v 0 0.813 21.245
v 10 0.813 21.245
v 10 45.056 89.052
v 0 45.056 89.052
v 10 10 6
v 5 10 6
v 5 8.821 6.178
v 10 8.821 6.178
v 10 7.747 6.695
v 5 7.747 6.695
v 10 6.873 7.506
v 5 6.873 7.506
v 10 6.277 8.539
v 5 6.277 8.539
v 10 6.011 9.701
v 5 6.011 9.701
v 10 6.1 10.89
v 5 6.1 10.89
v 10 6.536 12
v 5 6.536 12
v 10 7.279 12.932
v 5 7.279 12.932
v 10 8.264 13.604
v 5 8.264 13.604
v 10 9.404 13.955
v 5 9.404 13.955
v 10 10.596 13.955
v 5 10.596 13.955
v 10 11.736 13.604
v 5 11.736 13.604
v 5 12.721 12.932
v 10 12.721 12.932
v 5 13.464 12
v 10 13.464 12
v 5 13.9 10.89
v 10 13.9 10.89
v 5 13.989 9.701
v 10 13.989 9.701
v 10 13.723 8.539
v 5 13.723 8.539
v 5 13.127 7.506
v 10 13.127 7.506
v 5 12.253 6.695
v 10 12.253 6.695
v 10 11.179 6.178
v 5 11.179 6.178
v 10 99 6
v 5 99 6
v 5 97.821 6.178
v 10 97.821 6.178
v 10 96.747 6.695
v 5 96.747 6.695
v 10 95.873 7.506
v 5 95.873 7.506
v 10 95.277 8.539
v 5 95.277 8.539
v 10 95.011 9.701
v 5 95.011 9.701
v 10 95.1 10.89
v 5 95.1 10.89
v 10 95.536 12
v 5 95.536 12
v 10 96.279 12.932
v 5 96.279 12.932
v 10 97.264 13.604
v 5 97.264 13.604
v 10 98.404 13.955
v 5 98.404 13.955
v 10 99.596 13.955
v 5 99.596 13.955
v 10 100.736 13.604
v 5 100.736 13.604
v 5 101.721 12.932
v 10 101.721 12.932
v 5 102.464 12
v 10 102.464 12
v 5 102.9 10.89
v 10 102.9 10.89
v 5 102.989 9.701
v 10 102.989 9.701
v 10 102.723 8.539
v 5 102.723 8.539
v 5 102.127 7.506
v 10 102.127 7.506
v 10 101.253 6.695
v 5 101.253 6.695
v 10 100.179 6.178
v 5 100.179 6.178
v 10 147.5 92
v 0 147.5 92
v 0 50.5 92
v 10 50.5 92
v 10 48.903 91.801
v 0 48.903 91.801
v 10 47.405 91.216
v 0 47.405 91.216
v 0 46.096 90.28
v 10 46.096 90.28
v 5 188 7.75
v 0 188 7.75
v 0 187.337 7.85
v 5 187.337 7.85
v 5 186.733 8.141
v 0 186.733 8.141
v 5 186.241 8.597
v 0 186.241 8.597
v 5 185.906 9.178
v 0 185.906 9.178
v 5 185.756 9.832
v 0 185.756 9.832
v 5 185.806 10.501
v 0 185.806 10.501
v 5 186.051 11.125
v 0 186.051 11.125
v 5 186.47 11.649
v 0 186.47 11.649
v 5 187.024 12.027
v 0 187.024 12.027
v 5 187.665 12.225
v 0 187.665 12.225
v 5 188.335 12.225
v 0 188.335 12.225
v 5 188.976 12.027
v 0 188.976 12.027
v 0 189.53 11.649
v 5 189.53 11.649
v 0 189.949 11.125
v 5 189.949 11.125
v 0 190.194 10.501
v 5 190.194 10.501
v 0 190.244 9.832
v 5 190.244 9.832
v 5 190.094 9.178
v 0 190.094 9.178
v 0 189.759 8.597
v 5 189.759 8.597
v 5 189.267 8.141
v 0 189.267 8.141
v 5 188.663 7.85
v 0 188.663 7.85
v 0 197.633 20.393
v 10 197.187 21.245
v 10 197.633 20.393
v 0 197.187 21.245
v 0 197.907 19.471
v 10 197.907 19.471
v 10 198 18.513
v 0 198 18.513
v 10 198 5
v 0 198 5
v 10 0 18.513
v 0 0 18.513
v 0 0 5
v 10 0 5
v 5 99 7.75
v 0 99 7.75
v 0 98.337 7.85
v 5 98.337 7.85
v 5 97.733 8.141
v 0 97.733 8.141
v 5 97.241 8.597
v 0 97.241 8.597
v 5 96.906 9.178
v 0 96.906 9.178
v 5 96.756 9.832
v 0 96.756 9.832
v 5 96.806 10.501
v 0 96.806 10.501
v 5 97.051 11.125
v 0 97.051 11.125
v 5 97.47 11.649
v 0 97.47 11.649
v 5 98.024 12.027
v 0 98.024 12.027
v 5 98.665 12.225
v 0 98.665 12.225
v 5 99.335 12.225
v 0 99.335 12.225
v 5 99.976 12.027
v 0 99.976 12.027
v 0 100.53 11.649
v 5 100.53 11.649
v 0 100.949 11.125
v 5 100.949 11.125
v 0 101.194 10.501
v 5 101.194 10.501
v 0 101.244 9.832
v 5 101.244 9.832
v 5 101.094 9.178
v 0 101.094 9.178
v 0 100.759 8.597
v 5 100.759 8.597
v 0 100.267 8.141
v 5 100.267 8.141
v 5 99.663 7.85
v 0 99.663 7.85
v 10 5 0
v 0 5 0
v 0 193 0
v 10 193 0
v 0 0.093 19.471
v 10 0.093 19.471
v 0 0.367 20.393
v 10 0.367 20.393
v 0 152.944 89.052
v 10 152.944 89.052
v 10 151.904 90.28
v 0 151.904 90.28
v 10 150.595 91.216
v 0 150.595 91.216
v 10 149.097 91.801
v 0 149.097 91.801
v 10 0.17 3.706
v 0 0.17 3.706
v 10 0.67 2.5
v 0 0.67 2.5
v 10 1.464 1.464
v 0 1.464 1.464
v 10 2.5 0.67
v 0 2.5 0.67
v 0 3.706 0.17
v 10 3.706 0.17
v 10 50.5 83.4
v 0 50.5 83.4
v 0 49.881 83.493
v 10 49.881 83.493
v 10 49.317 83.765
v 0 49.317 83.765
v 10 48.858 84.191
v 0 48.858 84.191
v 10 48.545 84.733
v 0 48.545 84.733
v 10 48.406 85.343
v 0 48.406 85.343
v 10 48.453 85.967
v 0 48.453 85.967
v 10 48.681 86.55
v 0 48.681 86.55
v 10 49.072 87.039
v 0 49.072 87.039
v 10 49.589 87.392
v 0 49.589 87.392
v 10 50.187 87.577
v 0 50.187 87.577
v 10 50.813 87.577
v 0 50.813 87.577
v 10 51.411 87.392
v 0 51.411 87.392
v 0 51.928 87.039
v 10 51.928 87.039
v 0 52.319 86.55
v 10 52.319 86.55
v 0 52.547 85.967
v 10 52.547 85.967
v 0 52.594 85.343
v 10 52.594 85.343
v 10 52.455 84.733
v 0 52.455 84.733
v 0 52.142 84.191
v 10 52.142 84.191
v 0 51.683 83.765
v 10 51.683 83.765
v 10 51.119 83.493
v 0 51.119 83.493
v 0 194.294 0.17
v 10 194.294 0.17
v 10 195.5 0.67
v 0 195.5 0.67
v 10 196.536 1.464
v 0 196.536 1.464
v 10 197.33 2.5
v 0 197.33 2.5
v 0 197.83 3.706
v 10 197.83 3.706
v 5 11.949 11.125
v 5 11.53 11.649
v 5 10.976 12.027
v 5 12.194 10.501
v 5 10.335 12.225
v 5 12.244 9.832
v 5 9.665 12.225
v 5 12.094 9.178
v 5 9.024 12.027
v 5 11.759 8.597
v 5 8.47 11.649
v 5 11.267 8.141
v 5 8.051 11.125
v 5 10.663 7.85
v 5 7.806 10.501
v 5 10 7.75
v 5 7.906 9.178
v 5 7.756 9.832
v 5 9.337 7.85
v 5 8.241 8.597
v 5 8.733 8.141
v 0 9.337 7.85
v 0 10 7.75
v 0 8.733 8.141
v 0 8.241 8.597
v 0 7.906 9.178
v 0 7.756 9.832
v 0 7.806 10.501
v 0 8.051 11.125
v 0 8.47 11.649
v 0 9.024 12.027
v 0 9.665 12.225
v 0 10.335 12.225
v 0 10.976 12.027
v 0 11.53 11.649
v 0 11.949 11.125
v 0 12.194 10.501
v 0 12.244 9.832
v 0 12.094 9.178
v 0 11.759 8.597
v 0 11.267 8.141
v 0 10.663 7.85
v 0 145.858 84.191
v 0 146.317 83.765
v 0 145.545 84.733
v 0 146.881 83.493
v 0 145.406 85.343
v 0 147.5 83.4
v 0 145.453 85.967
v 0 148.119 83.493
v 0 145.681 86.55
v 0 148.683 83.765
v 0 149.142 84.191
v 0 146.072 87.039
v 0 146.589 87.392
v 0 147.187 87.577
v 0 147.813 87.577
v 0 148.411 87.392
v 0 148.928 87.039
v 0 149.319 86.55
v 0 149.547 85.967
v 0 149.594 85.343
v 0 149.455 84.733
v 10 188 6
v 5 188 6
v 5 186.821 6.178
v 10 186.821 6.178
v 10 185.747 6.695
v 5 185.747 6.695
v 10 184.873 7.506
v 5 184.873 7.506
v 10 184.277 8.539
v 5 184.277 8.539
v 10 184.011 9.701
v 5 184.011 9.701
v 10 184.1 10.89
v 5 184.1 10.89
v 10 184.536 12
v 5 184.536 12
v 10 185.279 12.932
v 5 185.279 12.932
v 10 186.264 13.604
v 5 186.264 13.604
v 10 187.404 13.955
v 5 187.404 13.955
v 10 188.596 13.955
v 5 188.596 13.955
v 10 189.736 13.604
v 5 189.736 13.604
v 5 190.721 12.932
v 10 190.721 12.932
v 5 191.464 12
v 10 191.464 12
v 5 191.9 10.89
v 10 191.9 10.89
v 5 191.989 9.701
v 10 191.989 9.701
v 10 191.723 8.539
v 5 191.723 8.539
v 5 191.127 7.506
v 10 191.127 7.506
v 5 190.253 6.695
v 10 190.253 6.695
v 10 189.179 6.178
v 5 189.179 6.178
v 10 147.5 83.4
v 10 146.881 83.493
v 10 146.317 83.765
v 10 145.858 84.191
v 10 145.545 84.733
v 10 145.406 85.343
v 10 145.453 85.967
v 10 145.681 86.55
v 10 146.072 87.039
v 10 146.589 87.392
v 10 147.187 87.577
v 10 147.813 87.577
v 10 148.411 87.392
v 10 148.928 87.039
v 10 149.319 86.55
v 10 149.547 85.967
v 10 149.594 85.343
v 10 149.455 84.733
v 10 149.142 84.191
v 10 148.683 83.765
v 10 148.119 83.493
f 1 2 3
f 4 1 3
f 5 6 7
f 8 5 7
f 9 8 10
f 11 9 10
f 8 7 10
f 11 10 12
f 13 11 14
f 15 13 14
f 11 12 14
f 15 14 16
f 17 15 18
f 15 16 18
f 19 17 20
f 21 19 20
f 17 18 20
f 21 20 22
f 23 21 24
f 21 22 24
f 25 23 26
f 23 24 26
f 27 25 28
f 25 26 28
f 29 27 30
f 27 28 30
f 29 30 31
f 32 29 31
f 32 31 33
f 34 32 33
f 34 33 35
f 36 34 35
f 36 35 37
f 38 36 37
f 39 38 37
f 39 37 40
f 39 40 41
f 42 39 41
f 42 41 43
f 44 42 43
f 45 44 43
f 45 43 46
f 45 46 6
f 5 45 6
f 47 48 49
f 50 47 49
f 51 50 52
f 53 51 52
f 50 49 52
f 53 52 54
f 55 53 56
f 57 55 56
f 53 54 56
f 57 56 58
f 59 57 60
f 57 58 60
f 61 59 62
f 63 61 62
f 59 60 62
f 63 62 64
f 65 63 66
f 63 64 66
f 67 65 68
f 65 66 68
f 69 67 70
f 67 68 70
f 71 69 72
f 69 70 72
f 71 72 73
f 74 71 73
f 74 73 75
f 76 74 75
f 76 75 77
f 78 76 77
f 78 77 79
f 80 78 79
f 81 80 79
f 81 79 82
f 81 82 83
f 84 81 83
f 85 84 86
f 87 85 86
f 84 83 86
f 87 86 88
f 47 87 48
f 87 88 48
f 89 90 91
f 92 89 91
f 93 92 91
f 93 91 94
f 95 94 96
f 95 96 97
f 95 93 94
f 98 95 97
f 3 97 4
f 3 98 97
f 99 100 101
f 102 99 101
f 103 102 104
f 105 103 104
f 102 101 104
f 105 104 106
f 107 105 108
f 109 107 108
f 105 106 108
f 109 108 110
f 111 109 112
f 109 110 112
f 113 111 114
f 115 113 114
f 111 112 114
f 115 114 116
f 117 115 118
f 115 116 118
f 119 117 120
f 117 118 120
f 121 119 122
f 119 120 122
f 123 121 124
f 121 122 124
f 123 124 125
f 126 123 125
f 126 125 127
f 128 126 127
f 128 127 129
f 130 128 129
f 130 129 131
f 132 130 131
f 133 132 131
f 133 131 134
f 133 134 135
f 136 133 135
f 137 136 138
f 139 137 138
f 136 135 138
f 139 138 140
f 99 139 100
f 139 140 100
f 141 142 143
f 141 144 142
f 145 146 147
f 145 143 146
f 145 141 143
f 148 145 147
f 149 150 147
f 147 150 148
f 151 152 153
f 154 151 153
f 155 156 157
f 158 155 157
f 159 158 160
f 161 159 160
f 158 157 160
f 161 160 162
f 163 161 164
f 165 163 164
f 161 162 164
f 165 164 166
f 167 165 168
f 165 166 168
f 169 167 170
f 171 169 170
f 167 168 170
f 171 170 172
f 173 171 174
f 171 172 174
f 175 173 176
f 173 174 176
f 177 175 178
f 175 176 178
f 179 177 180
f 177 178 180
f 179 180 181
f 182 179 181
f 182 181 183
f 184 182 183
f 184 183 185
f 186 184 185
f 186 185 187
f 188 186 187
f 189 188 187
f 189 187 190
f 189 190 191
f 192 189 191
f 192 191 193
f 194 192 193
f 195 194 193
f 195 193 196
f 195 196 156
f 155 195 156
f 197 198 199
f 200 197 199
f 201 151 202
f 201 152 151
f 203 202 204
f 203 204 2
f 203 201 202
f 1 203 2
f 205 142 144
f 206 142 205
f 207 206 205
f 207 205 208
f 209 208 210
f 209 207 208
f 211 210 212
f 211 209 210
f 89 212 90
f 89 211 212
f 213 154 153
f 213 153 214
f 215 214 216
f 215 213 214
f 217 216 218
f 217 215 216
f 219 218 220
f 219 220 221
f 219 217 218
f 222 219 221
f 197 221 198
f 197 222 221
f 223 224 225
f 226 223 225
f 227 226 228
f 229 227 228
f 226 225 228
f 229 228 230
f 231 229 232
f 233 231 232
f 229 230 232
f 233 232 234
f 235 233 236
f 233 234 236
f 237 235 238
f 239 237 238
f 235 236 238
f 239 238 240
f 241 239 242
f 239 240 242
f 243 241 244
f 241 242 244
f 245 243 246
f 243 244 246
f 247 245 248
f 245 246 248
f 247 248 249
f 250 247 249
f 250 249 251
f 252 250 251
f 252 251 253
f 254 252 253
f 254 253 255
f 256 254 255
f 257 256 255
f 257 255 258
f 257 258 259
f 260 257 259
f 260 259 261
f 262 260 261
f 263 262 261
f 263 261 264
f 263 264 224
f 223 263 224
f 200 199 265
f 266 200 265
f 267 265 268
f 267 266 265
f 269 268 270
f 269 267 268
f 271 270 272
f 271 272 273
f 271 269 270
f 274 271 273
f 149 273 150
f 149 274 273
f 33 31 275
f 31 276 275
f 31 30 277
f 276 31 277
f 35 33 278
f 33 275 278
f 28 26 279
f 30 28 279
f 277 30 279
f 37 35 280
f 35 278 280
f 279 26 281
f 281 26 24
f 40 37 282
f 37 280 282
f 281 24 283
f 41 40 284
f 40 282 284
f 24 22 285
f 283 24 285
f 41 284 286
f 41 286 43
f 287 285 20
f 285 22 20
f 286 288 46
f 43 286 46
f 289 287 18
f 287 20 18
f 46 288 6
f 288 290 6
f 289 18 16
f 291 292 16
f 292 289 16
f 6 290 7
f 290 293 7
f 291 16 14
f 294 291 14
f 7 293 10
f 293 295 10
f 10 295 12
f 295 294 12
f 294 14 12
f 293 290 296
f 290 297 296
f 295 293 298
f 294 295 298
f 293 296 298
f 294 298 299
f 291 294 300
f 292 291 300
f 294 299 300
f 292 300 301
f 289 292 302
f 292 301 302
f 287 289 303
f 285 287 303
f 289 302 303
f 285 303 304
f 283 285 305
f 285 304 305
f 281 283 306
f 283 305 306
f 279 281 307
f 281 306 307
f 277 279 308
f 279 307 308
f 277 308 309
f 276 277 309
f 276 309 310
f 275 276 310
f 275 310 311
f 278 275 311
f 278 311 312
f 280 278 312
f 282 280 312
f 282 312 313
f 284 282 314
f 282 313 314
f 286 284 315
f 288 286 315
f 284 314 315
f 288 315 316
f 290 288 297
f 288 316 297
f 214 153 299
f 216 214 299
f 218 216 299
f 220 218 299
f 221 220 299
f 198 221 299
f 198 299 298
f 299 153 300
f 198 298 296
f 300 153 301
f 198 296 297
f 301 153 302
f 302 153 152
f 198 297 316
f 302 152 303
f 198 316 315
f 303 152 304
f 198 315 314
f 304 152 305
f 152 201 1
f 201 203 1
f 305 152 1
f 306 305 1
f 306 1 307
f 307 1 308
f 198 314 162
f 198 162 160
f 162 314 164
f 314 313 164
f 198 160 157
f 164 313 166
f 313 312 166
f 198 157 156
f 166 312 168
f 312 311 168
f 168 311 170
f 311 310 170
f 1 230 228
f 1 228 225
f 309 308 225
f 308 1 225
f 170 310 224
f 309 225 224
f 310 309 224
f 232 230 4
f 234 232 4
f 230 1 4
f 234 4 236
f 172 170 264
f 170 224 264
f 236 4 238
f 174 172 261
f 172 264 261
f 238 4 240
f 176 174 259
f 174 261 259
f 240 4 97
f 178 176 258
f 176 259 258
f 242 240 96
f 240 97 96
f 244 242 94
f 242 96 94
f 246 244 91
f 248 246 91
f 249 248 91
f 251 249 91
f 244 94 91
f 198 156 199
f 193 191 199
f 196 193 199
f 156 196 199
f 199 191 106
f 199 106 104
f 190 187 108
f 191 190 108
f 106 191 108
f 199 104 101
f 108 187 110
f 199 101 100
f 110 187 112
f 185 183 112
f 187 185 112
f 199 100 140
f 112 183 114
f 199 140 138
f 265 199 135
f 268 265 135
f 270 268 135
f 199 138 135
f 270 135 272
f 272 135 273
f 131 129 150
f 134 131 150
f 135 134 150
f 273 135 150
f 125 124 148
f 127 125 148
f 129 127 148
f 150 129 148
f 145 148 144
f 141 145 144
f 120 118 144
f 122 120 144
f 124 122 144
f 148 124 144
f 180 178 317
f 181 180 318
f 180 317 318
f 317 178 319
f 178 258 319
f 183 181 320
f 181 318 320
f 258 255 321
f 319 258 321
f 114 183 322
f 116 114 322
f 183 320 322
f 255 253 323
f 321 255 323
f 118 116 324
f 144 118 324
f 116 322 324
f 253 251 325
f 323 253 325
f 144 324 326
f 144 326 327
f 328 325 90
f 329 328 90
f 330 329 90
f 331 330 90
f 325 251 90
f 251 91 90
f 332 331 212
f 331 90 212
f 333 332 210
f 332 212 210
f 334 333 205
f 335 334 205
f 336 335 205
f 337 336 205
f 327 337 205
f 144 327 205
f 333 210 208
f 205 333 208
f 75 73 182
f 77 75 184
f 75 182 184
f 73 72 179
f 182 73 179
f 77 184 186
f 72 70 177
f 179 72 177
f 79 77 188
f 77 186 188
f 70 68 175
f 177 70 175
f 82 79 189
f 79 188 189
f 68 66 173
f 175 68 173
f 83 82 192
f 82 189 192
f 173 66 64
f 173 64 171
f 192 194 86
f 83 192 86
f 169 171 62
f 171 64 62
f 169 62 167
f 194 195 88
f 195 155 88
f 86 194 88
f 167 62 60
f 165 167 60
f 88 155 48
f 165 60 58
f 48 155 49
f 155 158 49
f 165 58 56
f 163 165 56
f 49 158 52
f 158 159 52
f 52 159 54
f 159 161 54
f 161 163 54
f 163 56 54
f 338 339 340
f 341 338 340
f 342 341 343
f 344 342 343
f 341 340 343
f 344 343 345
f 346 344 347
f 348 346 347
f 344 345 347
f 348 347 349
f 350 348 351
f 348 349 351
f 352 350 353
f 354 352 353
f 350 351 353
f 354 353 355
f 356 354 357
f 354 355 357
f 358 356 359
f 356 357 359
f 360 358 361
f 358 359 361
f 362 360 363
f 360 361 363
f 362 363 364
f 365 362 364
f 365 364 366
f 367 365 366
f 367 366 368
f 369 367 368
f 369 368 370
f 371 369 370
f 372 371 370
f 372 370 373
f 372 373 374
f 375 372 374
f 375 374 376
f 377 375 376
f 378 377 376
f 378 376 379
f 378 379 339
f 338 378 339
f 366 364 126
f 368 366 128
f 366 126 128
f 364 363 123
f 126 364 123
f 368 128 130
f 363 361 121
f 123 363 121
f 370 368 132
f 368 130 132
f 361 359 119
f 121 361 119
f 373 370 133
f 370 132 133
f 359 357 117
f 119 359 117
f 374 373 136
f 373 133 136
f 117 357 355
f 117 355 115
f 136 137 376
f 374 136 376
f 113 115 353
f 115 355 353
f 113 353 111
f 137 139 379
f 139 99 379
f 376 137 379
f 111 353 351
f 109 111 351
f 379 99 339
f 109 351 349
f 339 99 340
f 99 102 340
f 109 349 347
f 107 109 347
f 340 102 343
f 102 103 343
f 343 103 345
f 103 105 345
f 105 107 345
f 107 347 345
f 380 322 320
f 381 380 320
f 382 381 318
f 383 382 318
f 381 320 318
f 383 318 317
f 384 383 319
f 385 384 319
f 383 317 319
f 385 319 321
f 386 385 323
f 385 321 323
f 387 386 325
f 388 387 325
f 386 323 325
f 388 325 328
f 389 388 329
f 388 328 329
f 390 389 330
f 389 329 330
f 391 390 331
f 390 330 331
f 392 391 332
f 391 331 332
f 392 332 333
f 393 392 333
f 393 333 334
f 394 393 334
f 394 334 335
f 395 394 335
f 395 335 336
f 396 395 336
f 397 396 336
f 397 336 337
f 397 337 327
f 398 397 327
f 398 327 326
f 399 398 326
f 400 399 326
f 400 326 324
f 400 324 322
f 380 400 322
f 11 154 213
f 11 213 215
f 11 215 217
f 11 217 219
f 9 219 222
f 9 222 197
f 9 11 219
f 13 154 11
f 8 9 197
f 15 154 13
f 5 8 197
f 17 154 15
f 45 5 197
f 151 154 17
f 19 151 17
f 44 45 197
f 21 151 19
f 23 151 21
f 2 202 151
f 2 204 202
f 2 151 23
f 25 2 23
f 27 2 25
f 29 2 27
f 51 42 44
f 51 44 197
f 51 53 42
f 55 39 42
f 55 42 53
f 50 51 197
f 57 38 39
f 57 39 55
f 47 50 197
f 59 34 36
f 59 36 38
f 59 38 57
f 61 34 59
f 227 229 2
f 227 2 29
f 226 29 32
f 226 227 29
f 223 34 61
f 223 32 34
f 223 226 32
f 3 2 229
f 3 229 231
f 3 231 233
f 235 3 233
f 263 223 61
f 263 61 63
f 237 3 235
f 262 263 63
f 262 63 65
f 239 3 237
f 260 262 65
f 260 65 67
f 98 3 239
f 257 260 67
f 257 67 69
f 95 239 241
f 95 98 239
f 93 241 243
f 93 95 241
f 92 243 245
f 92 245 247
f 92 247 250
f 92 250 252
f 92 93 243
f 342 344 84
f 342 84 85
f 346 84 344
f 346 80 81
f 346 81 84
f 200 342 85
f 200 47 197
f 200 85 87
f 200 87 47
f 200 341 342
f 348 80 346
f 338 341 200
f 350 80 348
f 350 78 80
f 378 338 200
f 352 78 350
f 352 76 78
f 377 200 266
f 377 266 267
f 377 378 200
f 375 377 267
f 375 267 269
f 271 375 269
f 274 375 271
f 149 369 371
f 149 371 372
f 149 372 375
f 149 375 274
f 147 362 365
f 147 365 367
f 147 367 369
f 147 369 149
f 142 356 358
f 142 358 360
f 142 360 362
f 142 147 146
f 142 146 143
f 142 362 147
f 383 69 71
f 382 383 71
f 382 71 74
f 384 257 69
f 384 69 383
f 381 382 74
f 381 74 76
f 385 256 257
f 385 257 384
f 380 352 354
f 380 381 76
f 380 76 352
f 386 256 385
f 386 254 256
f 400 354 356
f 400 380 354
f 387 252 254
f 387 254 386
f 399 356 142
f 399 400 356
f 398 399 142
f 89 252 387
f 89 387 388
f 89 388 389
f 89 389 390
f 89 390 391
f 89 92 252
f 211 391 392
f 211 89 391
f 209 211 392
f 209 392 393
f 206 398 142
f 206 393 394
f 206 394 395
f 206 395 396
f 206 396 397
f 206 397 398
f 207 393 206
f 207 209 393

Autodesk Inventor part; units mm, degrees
ref_plane "YZ Plane" through (0, 0, 0) normal (1, 0, 0) x (0, 1, 0)
ref_plane "XZ Plane" through (0, 0, 0) normal (0, 1, 0) x (-1, 0, 0)
ref_plane "XY Plane" through (0, 0, 0) normal (0, 0, 1) x (1, 0, 0)
sketch "Skizze1" plane through (0, 0, 0) normal (1, 0, 0) x (0, 1, 0)
  line L0 (0, 0) -> (198, 0)
  line L1 (198, 0) -> (198, 92)
  line L2 (198, 92) -> (0, 92)
  line L3 (0, 92) -> (0, 0)
  dimension "d0" = 198
  dimension "d1" = 92
extrude "Extrusion1" add sketch "Skizze1" along normal blind 10
sketch "Skizze2" plane through (10, 0, 0) normal (1, 0, 0) x (0, 0, -1)
  line L0 (-92, 0) -> (0, 0) projected
  line L1 (-85.5, 147.5) -> (-85.5, 50.5) construction
  line L2 (0, 0) -> (0, 198) projected
  dimension "d4" = 97
  dimension "d5" = 50.5
  dimension "d6" = 85.5
hole "Bohrung1" at (10, 147.5, 85.5) at (10, 50.5, 85.5) direction (-1, 0, 0) diameter 4.2 depth 10
sketch "Skizze3" plane through (10, 0, 0) normal (1, 0, 0) x (0, 0, -1)
  circle A0 centre (-85.5, 147.5) radius 2.1 projected
  circle A1 centre (-85.5, 50.5) radius 2.1 projected
  arc A2 (-92, 50.5) -> (-89.052, 45.0563) centre (-85.5, 50.5) ccw
  arc A3 (-89.052, 152.9437) -> (-92, 147.5) centre (-85.5, 147.5) ccw
  line L0 (0, 0) -> (0, 198) projected
  line L1 (0, 198) -> (-20, 198) construction
  line L2 (0, 0) -> (-20, 0) construction
  line L3 (-92, 0) -> (0, 0) projected
  line L4 (-20, 0) -> (-89.052, 45.0563)
  line L5 (-20, 198) -> (-89.052, 152.9437)
  line L6 (-92, 198) -> (-92, 0) projected
  line L7 (-20, 198) -> (-92, 198)
  line L8 (-92, 147.5) -> (-92, 198)
  line L9 (-92, 50.5) -> (-92, 0)
  line L10 (-92, 0) -> (-20, 0)
  dimension "d15" = 20
extrude "Extrusion2" cut sketch "Skizze3" against normal up to surface (10 mm away) contours L6 L7 L5 A3 | A2 L4 L3 L6
sketch "Skizze4" plane through (10, 0, 0) normal (1, 0, 0) x (0, 0, -1)
  line L0 (0, 0) -> (0, 198) projected
  line L1 (-20, 0) -> (0, 0) projected
  line L2 (0, 198) -> (-20, 198) projected
  line L3 (-92, 147.5) -> (-92, 50.5) projected
  line L4 (-92, 99) -> (0, 99)
  point P0 (-10, 10)
  point P1 (-10, 188)
  point P2 (-10, 99)
  dimension "d18" = 10
  dimension "d19" = 10
  dimension "d20" = 10
hole "Bohrung2" at (10, 10, 10) at (10, 188, 10) at (10, 99, 10) direction (-1, 0, 0) diameter 4.5 end through all counterbore diameter 8 counterbore depth 5
fillet "Rundung1" radius 5 4 edges at (5, 198, 20) (5, 0, 20) (5, 0, 0) (5, 198, 0)
properties part number "102.006.01_Anbindung_Aktor"
